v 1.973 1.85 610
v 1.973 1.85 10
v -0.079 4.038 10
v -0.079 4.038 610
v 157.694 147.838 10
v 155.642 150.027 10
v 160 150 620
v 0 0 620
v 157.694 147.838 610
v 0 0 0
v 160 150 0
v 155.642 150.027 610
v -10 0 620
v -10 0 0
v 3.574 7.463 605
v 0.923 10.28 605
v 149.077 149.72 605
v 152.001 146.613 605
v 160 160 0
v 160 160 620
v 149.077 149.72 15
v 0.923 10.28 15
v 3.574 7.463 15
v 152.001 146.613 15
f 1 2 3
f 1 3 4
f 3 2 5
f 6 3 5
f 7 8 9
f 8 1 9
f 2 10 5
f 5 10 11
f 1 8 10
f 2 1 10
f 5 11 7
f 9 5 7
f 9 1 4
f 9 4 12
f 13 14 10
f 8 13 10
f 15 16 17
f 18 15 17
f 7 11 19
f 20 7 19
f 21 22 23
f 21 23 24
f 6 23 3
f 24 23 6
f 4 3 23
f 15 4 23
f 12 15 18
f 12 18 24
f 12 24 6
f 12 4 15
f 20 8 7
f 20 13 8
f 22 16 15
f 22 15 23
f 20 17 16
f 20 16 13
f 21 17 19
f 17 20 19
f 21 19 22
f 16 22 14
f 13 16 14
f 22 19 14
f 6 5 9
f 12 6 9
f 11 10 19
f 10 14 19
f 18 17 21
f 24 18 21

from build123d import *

# Parameters (mm, degrees)
SALIENTE_EXTRUIR1_DEPTH = 620
CROQUIS2_W              = 203.452350599
CROQUIS2_H              = 590
CORTAR_EXTRUIR1_DEPTH   = 117.511998831
CROQUIS3_W              = 213.451905324
CROQUIS3_H              = 600
CORTAR_EXTRUIR2_DEPTH   = 3


with BuildPart() as part:
    # Croquis1 → Saliente-Extruir1 (new body)
    with BuildSketch(Plane.XY):
        Polygon((0, 0), (160, 150), (160, 160), (-10, 0), align=None)
    extrude(amount=SALIENTE_EXTRUIR1_DEPTH)

    # Croquis2 → Cortar-Extruir1 (cut, through all)
    with BuildSketch(Plane(origin=(-4.697247706, 4.990825688, 0), x_dir=(0.728199993, 0.685364699, 0), z_dir=(-0.685364699, 0.728199993, 0))):
        with Locations((109.444175373, -310)):
            Rectangle(CROQUIS2_W, CROQUIS2_H)
    extrude(amount=-CORTAR_EXTRUIR1_DEPTH, mode=Mode.SUBTRACT)

    # Croquis3 → Cortar-Extruir2 (cut)
    with BuildSketch(Plane(origin=(0, 0, 0), x_dir=(0.729537204, 0.683941129, 0), z_dir=(0.683941129, -0.729537204, 0))):
        with Locations((109.430580621, 310)):
            Rectangle(CROQUIS3_W, CROQUIS3_H)
    extrude(amount=-CORTAR_EXTRUIR2_DEPTH, mode=Mode.SUBTRACT)


solid = part.part
